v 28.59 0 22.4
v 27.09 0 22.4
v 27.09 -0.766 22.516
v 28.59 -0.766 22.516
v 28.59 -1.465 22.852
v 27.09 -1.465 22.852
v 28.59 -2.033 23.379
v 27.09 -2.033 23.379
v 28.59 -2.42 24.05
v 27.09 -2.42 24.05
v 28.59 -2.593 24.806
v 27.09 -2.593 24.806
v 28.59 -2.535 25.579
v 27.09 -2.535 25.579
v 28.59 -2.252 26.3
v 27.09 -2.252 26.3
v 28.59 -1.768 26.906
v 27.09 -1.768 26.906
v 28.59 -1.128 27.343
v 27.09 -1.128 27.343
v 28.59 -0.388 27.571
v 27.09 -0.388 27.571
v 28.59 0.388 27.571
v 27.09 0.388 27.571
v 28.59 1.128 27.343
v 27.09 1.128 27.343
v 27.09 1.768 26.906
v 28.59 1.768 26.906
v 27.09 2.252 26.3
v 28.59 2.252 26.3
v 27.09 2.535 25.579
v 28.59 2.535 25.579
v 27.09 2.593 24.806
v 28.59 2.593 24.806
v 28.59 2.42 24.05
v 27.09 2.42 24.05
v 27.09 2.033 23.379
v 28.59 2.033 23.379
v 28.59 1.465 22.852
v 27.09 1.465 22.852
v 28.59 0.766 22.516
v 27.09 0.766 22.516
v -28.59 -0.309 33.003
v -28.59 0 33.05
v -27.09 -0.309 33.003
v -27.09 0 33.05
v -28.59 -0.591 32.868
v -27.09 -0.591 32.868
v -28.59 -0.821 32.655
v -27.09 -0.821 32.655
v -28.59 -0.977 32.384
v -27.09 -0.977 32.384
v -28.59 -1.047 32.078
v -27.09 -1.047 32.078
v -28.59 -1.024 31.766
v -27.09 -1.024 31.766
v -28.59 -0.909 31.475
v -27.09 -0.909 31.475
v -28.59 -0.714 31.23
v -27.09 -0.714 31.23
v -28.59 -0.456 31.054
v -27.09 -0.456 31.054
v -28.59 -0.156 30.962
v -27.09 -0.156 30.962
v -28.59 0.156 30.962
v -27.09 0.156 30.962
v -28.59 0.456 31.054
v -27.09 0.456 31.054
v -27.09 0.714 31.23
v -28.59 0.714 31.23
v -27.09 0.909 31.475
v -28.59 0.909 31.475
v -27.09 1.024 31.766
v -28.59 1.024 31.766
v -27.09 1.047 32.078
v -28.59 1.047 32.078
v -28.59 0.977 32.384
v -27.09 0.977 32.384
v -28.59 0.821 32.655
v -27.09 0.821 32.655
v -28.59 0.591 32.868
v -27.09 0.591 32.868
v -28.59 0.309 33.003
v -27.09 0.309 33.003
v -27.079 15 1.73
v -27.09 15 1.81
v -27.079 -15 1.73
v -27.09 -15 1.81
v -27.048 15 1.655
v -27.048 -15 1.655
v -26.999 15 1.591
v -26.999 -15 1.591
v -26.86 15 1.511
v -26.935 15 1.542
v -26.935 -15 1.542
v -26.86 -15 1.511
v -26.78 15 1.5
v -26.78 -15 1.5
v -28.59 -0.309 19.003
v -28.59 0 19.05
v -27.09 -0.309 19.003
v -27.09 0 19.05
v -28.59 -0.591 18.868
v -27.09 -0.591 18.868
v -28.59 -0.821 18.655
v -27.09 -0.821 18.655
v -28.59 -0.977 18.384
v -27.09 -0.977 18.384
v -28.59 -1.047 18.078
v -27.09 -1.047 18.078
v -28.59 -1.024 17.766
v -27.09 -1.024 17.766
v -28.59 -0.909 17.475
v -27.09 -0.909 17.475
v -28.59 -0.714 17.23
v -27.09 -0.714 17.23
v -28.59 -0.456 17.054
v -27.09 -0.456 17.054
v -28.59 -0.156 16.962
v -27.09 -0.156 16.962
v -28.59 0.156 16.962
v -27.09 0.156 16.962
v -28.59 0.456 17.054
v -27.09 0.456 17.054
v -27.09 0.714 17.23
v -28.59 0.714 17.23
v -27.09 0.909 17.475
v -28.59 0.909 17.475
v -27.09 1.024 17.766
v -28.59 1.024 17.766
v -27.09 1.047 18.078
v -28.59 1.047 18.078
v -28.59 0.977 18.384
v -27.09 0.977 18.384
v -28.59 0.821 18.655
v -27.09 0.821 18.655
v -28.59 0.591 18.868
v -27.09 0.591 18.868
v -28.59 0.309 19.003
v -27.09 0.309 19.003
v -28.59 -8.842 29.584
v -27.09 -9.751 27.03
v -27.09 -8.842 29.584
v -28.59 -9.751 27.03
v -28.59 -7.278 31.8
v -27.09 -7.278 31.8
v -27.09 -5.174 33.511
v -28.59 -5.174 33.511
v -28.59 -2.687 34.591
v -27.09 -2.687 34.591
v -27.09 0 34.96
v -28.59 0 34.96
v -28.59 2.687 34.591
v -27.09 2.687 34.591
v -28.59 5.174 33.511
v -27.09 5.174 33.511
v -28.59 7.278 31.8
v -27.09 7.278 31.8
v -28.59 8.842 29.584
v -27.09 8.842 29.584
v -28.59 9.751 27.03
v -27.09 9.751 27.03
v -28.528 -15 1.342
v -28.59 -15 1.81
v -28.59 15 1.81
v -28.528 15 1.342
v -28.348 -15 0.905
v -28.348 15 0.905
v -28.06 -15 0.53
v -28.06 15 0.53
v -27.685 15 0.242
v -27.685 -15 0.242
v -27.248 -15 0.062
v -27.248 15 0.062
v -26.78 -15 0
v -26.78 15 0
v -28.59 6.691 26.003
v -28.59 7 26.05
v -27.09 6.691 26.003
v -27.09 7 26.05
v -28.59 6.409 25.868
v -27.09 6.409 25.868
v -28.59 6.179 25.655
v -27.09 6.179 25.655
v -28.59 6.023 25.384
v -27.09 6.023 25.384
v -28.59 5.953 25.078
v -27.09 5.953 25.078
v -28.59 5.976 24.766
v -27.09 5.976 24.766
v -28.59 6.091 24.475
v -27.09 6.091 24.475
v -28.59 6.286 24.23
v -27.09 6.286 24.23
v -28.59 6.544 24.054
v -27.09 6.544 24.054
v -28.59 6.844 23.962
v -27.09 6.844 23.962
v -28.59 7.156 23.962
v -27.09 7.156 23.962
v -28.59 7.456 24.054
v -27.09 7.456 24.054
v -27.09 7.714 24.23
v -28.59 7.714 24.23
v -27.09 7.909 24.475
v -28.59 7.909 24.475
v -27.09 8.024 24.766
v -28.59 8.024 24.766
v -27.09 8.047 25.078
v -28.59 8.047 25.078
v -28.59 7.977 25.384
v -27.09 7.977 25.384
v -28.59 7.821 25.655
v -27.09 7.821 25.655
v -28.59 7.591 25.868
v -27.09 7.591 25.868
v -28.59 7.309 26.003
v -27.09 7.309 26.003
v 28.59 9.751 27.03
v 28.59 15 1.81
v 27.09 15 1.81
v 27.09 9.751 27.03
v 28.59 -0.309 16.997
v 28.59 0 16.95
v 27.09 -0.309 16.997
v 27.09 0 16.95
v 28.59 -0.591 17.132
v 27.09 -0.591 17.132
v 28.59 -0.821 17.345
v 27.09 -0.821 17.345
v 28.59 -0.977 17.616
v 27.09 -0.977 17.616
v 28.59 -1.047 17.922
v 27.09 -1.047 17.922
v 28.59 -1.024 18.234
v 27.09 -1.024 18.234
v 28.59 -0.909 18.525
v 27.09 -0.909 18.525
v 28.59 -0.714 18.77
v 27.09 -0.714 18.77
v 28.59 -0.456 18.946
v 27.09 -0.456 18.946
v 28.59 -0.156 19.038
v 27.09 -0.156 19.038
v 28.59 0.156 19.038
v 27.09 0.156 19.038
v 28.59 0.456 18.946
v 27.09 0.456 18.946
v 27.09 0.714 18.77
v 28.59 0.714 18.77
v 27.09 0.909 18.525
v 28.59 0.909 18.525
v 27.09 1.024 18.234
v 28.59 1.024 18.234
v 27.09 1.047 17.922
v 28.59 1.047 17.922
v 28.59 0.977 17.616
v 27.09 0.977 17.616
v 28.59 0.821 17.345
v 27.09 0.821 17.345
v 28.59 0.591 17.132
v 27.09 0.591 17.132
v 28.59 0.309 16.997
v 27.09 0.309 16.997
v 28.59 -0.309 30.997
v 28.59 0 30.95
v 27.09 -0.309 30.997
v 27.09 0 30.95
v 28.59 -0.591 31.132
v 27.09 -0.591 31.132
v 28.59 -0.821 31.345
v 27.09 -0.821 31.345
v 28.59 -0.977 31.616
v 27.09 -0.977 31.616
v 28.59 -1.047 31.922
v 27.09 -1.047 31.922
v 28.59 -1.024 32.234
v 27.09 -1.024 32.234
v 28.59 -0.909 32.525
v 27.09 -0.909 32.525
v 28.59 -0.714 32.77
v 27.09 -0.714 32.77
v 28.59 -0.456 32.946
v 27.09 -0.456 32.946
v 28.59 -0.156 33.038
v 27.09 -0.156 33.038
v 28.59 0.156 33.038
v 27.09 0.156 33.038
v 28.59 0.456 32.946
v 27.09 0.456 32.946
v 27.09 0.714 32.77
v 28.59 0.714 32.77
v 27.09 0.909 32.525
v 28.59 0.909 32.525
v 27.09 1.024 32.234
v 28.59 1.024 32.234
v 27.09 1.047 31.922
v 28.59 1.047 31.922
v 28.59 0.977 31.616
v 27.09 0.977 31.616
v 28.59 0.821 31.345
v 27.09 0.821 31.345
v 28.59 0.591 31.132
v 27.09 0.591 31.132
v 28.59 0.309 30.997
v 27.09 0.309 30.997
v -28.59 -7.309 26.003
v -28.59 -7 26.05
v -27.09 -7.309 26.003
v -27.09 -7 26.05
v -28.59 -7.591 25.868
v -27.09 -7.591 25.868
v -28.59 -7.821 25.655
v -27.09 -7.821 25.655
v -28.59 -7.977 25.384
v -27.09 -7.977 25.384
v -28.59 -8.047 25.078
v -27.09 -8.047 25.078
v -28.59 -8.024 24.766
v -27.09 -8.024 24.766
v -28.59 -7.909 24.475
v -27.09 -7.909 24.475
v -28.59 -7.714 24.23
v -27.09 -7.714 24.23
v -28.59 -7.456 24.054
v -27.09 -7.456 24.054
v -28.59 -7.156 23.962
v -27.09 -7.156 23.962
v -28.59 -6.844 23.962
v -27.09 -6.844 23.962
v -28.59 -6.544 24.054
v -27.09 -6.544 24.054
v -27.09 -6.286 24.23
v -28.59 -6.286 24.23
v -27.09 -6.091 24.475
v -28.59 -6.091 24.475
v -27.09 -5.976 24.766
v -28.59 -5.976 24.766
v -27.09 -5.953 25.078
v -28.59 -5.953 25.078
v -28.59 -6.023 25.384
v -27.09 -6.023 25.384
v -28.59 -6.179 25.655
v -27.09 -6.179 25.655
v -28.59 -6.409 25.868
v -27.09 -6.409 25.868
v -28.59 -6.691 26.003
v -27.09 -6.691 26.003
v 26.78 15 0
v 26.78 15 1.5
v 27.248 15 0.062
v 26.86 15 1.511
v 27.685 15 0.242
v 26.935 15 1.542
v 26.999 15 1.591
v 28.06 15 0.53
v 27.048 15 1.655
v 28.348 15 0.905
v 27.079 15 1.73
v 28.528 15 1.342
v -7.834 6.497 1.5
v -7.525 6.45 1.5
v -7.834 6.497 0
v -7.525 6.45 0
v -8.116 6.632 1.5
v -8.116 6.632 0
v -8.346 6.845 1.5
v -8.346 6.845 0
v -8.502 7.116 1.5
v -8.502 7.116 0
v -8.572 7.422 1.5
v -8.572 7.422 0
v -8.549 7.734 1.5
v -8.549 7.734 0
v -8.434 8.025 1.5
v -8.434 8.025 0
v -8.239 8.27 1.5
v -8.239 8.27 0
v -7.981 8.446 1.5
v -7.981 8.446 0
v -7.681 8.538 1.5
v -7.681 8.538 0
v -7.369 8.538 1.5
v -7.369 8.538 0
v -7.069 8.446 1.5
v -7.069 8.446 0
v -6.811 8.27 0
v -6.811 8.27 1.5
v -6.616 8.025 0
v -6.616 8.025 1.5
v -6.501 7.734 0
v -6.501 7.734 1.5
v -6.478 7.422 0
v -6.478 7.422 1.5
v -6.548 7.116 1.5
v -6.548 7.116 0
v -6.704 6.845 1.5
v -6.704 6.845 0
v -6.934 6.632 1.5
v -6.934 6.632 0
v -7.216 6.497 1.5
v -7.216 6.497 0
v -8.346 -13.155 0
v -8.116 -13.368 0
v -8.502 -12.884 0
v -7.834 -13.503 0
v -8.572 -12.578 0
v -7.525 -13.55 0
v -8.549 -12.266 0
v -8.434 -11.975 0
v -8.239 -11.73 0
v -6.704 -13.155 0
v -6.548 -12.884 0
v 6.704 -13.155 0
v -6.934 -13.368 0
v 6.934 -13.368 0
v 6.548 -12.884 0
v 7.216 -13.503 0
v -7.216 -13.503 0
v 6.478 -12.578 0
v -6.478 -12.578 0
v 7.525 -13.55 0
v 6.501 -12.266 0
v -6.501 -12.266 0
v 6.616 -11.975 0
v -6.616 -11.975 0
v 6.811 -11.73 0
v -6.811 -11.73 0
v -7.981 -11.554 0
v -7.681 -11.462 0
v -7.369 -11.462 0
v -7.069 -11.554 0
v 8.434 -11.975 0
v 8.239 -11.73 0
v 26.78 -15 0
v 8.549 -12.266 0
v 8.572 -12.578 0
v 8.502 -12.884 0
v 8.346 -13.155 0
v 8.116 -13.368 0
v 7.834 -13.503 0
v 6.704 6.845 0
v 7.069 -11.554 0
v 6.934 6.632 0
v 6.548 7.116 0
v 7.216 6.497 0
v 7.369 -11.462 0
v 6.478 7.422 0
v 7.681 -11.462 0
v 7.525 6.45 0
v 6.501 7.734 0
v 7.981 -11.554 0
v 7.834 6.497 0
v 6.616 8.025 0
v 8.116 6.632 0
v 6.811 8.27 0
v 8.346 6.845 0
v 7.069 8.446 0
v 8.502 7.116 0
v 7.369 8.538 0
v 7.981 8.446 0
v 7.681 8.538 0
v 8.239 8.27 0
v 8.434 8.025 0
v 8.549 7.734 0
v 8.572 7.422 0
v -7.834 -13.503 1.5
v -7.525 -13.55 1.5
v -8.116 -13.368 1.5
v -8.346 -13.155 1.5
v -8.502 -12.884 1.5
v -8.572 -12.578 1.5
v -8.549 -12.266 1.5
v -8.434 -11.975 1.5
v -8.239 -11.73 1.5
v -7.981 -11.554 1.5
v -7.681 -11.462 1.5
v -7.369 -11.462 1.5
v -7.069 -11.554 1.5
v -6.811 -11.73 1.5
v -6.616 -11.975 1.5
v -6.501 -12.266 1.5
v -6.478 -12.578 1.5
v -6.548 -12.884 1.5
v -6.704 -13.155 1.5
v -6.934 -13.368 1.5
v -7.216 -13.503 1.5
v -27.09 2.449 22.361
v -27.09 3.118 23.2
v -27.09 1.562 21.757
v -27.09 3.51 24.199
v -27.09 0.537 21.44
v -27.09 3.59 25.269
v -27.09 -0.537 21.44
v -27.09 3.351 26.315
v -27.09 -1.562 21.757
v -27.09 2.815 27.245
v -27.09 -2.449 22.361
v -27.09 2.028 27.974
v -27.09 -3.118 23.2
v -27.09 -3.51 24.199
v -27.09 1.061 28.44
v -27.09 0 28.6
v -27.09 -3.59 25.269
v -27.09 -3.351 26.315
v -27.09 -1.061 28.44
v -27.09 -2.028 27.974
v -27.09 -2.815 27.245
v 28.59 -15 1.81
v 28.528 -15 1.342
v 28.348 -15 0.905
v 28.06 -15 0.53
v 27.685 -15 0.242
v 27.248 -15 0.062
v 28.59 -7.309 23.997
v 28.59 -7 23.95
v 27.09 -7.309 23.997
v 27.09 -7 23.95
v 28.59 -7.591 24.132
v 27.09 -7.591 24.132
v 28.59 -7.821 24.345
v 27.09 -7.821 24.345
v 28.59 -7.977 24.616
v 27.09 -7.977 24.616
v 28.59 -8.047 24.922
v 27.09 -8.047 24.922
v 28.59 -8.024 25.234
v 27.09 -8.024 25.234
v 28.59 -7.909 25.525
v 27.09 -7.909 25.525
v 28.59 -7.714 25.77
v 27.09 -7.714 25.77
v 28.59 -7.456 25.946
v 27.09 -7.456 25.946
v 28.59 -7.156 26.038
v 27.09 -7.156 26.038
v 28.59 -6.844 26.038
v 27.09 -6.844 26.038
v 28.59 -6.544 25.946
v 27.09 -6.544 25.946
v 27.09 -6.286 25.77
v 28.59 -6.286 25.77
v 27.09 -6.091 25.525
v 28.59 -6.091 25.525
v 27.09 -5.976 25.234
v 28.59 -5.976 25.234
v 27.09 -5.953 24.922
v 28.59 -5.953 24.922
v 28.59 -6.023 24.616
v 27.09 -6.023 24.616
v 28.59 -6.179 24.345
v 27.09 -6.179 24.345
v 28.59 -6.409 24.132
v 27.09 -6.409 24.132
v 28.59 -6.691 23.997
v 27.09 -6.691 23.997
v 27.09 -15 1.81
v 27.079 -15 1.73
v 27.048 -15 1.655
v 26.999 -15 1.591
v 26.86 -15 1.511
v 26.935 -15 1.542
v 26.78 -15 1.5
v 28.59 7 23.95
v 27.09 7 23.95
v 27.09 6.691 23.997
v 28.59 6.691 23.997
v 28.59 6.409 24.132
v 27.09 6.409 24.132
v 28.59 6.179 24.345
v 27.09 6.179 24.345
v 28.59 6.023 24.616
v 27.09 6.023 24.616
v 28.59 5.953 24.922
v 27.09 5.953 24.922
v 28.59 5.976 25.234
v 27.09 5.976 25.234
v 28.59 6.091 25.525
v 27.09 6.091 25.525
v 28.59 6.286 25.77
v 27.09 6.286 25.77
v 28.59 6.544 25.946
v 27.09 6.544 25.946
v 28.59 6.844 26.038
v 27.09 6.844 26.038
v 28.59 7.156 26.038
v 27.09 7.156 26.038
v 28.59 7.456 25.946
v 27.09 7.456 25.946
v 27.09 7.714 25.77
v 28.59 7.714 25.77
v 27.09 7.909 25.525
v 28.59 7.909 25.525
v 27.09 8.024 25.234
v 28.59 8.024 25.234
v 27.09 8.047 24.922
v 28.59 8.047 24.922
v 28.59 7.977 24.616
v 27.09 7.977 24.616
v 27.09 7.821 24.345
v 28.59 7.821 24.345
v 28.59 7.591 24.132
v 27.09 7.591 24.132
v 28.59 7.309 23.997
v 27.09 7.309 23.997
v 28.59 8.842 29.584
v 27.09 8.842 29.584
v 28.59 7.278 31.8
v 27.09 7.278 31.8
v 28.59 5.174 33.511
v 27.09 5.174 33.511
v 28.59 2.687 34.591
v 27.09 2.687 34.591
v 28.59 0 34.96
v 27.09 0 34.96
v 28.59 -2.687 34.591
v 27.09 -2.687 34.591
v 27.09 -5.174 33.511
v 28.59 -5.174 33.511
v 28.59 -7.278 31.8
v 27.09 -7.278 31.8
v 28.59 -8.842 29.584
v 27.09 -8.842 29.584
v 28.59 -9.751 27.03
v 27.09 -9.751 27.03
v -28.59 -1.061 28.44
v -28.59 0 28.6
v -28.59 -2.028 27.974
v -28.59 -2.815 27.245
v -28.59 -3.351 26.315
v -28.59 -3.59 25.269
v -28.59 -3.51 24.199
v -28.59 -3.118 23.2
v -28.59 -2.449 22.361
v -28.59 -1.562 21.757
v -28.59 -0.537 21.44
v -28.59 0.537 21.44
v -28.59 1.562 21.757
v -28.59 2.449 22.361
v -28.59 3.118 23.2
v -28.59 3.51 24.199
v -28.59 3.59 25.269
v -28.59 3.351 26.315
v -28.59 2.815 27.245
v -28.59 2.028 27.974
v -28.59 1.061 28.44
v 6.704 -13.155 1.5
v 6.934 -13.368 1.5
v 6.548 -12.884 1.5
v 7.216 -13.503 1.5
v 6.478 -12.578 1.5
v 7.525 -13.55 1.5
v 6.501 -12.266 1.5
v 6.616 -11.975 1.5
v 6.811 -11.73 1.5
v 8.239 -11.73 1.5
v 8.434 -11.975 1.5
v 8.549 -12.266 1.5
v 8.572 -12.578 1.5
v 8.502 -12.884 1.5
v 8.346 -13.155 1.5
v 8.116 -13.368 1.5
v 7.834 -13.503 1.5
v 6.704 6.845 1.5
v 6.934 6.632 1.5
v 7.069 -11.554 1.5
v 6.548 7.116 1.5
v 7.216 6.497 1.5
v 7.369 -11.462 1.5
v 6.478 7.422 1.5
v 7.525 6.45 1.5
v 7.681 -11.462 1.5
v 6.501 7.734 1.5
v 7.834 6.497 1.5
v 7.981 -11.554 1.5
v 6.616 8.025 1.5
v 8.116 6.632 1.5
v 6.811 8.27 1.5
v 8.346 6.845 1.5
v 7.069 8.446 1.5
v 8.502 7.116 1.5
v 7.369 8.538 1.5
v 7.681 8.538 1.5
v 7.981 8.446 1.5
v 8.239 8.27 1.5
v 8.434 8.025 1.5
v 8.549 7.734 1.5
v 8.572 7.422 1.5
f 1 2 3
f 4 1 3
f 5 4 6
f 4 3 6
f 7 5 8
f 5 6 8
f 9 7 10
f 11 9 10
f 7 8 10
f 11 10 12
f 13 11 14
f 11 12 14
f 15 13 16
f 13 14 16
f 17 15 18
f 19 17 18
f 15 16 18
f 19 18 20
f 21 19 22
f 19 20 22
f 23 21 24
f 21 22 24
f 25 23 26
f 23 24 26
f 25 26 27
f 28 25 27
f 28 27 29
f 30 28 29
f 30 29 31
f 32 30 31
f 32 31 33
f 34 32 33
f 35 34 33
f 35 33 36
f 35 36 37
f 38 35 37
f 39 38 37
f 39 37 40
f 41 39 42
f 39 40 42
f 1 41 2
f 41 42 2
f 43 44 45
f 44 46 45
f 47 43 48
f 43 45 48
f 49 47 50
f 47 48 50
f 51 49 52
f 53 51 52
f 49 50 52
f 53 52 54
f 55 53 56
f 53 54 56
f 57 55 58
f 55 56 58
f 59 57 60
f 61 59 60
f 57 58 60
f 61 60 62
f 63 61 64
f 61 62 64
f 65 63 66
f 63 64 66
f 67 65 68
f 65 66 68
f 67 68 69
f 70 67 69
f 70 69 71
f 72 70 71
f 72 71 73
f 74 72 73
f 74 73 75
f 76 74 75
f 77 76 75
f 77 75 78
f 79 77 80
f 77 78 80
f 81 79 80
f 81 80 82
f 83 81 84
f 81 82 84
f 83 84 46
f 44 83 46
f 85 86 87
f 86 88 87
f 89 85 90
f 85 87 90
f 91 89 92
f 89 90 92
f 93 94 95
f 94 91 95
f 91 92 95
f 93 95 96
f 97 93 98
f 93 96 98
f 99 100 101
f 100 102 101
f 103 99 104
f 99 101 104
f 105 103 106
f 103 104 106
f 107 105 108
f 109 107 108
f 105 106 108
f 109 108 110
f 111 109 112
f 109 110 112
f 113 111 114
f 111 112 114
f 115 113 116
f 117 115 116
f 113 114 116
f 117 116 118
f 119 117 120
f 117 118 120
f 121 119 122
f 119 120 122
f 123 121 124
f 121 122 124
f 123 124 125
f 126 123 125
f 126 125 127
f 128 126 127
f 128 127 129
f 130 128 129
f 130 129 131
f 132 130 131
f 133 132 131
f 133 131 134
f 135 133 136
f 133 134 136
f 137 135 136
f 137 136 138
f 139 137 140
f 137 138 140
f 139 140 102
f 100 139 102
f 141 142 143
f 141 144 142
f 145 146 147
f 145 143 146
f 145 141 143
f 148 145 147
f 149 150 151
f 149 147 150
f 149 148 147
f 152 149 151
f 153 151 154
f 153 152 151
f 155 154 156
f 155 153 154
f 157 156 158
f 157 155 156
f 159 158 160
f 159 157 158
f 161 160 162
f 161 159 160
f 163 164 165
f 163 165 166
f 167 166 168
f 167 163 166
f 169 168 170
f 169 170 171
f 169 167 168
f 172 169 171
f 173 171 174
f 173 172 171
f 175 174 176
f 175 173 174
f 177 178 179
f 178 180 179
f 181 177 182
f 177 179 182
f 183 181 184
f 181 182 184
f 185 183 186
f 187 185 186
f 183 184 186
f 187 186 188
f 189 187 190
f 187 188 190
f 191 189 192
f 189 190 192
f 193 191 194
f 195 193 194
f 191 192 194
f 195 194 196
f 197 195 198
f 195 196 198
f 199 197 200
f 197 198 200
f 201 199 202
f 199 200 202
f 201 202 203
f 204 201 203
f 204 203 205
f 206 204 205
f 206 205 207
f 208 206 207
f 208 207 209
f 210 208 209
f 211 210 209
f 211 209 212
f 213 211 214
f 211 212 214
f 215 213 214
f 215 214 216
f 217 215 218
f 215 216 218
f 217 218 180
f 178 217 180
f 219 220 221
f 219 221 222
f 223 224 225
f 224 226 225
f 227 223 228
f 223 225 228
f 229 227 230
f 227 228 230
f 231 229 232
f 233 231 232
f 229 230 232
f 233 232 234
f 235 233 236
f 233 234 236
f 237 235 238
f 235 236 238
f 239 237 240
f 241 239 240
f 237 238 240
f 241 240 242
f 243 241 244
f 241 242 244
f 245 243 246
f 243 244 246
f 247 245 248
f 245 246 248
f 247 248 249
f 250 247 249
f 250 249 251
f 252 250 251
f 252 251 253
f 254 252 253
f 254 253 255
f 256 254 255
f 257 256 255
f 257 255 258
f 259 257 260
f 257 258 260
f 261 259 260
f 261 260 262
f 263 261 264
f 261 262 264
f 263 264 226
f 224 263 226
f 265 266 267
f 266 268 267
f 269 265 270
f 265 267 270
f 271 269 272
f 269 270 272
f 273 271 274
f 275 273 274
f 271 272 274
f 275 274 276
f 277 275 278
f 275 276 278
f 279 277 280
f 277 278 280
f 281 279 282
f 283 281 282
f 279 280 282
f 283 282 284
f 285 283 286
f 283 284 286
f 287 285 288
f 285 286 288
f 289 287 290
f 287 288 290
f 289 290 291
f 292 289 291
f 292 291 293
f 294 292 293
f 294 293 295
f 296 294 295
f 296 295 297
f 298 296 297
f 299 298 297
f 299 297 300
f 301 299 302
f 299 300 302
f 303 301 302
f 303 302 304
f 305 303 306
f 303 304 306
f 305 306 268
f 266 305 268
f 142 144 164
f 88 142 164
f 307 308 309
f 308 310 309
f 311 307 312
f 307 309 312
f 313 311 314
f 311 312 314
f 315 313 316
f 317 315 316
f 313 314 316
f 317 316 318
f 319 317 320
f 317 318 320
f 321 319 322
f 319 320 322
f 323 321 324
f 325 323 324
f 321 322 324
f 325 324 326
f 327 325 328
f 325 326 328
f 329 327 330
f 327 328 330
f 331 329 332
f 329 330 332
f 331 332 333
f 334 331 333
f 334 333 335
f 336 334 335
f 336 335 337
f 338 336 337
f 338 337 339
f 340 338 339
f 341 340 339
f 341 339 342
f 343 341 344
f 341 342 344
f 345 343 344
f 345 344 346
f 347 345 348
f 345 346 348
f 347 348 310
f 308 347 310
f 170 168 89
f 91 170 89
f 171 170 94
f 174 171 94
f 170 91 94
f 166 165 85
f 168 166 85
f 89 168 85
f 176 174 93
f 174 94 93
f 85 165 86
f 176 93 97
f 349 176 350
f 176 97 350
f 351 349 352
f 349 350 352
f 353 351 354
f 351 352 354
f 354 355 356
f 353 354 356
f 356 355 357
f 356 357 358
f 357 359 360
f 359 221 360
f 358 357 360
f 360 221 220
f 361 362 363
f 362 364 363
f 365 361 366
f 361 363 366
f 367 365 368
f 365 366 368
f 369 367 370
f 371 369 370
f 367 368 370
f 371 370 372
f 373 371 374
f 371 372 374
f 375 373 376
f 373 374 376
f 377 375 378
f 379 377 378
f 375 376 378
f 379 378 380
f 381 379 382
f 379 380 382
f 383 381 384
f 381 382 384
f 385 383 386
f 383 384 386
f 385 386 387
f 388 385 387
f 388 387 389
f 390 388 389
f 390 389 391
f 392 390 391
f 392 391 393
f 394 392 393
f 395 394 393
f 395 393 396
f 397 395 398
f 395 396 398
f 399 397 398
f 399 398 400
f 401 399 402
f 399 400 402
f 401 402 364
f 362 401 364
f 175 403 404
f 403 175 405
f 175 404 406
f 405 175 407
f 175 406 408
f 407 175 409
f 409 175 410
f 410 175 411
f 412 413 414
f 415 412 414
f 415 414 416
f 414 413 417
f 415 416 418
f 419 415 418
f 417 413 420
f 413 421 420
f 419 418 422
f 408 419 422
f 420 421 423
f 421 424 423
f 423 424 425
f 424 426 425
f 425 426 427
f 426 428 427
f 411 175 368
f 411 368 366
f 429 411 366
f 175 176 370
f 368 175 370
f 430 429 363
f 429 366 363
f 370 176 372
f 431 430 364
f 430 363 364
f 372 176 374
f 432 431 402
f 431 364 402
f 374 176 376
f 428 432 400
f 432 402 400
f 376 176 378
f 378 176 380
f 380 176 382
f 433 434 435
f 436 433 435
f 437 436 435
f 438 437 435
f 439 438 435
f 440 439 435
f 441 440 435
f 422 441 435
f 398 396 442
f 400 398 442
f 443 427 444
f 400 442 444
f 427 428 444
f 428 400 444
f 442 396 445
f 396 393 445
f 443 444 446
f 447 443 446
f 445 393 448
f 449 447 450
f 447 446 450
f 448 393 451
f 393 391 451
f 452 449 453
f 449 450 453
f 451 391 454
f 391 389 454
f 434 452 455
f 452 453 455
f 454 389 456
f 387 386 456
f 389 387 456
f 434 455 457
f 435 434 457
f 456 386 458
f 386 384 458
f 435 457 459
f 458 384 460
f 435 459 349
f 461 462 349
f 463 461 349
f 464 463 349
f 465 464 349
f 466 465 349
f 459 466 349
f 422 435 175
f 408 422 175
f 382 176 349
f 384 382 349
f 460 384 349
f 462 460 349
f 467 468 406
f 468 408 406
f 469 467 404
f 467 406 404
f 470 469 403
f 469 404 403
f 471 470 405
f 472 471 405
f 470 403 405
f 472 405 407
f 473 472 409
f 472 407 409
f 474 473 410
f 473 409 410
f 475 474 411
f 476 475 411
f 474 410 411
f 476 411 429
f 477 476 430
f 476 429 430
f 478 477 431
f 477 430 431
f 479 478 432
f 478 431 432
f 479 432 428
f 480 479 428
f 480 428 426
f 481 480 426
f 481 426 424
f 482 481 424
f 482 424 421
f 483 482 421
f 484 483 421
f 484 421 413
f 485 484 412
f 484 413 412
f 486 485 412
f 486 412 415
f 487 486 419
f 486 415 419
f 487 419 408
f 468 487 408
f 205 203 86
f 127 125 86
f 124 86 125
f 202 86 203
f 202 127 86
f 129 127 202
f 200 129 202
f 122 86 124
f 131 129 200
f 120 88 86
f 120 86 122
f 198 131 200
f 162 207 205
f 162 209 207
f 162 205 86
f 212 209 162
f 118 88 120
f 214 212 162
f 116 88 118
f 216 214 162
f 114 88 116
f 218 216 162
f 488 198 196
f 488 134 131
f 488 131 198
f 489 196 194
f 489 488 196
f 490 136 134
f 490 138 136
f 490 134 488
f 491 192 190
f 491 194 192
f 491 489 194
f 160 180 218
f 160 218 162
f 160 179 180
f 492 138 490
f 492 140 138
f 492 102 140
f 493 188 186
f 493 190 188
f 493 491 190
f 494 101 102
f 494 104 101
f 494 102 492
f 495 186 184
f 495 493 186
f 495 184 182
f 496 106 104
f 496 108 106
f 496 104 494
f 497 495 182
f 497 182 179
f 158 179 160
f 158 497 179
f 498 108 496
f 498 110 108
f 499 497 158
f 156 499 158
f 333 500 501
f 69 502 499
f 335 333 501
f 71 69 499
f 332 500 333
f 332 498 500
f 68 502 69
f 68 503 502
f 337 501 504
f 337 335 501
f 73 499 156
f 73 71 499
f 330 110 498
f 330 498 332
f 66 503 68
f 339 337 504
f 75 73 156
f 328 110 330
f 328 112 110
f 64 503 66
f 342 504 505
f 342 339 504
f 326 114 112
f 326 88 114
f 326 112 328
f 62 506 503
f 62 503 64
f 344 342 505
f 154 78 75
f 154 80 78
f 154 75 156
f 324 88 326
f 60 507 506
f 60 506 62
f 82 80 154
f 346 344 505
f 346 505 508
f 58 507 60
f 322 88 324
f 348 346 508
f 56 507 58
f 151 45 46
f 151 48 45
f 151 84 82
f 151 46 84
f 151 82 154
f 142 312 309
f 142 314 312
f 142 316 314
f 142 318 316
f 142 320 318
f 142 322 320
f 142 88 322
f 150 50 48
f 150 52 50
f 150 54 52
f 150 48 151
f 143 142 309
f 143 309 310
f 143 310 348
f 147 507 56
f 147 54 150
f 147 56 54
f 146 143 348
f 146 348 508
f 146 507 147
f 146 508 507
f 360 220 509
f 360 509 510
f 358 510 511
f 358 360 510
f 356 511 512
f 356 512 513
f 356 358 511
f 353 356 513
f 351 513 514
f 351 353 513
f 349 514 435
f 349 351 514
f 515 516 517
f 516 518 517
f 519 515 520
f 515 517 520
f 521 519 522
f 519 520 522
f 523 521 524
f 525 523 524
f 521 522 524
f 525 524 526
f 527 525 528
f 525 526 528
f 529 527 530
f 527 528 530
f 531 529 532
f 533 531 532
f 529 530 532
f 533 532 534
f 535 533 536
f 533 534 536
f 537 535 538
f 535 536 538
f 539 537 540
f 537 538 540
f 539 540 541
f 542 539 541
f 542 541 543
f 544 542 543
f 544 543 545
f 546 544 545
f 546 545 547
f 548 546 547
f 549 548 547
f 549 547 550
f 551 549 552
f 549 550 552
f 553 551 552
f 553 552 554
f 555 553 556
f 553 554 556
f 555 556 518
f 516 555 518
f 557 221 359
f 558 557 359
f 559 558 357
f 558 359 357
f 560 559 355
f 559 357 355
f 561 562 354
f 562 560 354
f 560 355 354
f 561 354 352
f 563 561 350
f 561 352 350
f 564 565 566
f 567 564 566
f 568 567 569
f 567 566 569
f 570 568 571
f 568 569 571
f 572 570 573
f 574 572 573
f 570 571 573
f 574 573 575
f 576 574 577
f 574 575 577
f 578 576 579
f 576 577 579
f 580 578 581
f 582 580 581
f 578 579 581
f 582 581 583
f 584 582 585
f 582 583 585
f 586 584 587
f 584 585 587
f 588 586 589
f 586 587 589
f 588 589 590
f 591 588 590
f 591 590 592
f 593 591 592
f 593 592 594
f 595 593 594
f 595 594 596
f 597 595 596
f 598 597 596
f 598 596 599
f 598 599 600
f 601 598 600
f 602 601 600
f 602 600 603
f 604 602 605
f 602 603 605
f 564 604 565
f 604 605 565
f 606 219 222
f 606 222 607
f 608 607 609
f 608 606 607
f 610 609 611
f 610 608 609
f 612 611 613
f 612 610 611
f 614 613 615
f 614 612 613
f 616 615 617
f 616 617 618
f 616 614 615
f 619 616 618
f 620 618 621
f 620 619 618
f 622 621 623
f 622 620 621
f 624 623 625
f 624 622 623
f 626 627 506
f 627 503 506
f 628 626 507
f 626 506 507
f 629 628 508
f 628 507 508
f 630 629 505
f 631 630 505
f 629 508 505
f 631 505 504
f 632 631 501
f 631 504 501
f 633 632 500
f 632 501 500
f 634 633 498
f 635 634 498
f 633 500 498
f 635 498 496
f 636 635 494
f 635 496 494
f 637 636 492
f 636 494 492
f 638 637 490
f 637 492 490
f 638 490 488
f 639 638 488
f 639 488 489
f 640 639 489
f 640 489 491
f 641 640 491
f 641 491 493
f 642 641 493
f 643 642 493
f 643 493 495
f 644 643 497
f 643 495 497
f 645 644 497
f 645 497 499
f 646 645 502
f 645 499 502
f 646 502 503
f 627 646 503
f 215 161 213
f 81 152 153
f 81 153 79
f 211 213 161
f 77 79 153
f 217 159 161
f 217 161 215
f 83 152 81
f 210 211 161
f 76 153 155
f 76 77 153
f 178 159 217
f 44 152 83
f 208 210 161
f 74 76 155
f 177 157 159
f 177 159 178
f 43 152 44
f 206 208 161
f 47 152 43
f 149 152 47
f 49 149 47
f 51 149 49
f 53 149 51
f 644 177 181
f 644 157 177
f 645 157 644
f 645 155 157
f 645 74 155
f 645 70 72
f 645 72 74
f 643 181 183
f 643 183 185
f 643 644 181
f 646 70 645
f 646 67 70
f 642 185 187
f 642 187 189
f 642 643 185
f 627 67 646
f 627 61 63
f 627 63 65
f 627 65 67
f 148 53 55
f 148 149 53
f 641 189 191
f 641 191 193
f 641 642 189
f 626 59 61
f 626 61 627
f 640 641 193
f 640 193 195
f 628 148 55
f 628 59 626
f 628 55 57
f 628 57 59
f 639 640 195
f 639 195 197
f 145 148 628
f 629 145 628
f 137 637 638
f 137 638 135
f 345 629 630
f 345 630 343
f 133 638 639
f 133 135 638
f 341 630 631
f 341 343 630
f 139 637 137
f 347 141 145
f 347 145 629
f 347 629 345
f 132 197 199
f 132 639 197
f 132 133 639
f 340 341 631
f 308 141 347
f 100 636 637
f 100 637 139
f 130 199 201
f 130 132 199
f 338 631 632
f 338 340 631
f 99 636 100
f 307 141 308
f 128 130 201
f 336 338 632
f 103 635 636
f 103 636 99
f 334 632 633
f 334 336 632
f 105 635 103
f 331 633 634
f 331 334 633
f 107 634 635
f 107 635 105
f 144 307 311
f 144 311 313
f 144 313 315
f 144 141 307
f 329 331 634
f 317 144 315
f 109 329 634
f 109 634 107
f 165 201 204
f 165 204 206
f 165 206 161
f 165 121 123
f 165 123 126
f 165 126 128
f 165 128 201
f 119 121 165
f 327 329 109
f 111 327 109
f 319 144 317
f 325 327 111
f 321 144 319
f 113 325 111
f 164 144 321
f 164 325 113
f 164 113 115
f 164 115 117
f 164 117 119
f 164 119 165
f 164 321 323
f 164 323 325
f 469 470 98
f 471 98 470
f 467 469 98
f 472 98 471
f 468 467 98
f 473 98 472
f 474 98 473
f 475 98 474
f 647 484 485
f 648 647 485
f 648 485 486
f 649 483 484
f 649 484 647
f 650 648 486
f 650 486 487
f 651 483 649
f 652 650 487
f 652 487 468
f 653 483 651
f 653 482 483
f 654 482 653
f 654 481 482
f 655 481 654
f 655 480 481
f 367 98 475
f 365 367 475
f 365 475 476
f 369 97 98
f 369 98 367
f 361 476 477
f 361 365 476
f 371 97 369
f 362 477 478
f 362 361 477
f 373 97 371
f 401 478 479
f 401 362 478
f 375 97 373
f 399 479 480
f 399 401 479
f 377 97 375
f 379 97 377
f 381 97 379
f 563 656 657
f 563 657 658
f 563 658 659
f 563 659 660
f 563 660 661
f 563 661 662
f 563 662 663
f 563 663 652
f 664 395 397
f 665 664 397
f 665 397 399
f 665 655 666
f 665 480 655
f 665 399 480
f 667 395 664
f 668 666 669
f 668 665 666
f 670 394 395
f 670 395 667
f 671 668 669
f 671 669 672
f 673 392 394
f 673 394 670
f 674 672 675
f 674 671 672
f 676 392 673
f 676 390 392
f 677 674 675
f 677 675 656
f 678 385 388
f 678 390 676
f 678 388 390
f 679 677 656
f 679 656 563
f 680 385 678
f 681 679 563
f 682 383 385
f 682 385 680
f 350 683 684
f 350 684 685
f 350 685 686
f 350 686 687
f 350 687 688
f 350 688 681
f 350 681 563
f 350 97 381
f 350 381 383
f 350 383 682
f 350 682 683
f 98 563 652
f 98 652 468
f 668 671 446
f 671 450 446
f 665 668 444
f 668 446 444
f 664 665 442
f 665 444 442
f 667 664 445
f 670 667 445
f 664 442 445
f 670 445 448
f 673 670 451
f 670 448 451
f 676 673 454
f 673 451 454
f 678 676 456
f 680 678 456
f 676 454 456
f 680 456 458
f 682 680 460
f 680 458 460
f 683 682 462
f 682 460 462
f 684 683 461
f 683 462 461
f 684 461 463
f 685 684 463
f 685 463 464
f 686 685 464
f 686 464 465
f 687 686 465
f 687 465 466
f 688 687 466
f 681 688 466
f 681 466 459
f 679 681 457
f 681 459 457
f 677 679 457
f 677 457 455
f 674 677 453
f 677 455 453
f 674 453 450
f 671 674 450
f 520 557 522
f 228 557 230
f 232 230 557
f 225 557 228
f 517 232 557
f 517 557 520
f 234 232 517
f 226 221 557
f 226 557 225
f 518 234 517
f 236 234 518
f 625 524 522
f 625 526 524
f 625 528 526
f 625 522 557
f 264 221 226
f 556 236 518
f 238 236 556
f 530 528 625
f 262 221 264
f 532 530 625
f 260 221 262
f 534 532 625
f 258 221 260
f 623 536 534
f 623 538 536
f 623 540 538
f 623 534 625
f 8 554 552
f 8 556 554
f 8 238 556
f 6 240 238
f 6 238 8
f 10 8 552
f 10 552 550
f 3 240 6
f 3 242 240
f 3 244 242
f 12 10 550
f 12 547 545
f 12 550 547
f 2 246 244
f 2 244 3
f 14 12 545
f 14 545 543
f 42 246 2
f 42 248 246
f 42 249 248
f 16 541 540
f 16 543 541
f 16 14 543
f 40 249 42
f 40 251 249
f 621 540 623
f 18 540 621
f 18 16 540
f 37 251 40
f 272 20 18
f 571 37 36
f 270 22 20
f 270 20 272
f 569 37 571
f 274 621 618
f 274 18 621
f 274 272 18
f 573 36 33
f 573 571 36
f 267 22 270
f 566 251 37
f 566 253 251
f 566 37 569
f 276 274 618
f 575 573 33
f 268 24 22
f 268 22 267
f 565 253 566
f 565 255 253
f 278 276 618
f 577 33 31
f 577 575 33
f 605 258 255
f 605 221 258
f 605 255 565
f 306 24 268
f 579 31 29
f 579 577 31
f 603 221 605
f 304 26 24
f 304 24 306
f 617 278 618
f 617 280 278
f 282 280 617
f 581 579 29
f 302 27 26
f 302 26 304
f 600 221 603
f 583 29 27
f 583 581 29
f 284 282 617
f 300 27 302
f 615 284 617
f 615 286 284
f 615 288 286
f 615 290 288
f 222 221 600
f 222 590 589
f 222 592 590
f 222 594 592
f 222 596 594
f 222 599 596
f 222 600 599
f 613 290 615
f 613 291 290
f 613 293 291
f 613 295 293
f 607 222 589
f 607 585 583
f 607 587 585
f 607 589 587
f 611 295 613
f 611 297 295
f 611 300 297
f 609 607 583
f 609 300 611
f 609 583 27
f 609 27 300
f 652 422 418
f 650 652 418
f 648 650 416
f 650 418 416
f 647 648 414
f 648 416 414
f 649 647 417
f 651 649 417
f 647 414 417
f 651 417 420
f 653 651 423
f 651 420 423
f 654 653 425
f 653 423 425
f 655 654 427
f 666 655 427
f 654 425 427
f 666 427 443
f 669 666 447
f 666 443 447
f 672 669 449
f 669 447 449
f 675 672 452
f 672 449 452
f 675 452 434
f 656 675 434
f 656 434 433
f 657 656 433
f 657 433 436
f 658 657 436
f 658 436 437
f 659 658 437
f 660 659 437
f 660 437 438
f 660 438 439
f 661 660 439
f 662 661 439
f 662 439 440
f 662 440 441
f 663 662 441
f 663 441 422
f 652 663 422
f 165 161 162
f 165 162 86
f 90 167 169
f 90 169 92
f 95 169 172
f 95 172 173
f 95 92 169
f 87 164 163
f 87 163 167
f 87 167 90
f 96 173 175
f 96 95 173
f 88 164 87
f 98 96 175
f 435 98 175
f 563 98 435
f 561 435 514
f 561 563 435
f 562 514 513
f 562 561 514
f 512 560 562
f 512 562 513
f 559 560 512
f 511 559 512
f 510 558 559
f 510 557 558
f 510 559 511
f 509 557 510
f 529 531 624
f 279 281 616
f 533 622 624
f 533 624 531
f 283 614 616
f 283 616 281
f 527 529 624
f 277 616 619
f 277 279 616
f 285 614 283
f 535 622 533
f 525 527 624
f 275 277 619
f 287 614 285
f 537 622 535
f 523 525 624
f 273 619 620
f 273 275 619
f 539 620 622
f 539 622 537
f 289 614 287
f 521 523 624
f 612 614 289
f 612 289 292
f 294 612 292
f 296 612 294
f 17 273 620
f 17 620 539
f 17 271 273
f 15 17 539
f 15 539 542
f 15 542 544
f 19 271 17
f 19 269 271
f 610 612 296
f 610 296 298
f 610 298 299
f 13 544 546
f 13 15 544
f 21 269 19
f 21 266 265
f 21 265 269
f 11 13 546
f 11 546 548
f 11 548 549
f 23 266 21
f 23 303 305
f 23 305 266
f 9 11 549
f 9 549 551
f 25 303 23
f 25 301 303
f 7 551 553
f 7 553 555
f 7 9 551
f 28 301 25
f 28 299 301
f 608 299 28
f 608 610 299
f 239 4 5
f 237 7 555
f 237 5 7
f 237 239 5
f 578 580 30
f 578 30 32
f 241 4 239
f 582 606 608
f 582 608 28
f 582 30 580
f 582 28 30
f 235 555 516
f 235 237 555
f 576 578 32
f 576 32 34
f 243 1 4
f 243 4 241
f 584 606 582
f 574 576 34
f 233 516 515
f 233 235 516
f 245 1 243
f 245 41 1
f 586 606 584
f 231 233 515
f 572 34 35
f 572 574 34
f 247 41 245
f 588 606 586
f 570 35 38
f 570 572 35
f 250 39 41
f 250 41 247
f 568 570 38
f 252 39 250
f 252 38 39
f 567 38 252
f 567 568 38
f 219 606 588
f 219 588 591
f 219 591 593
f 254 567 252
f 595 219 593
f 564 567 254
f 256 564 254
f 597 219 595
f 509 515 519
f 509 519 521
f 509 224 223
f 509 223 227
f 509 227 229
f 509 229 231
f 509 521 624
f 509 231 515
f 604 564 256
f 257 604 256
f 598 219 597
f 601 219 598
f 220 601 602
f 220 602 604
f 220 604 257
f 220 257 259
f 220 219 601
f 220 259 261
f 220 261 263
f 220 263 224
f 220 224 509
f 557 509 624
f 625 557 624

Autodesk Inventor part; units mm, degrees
ref_plane "YZ Plane" through (0, 0, 0) normal (1, 0, 0) x (0, 1, 0)
ref_plane "XZ Plane" through (0, 0, 0) normal (0, 1, 0) x (-1, 0, 0)
ref_plane "XY Plane" through (0, 0, 0) normal (0, 0, 1) x (1, 0, 0)
sketch "Sketch1" plane through (0, 0, 0) normal (0, 0, 1) x (1, 0, 0)
  line L0 (-28.59, -15) -> (28.59, -15)
  line L1 (28.59, -15) -> (28.59, 15)
  line L2 (28.59, 15) -> (-28.59, 15)
  line L3 (-28.59, 15) -> (-28.59, -15)
  line L4 (-28.59, -15) -> (28.59, 15) construction
  line L5 (28.59, -15) -> (-28.59, 15) construction
  point P0 (0, 0)
  dimension "d0" = 57.18
  dimension "d1" = 30
extrude "Plate1" add sketch "Sketch1" along normal blind 1.5
sketch "Sketch2" plane through (-27.09, -15, 0) normal (-1, 0, 0) x (0, -1, 0)
  line L0 (-30, 0) -> (0, 0)
  line L1 (0, 0) -> (0, 40)
  line L2 (0, 40) -> (-30, 40)
  line L3 (-30, 40) -> (-30, 0)
edge flange "Flange1" height 40 angle 90 thickness 1.5 bend radius 0.31 thickness toward (-1, 0, 0) relief tear relief width 1.5 relief depth 0.75 corner gap 0.31 corner form 0 edges at (-28.59, 0, 1.5) (28.59, 0, 1.5) wall of the first edge with corners at (-27.09, 15, 0) (-27.09, -15, 0) (-27.09, -15, 40) (-27.09, 15, 40)
bend "Bend1"
corner "Corner1"
sketch "Sketch3" plane through (28.59, -15, 40) normal (1, 0, 0) x (0, 0, -1)
  circle A0 centre (15, 15) radius 9.96
  line L0 (0, 30) -> (38.19, 30) projected
  line L1 (38.19, 0) -> (0, 0) projected
  line L2 (38.19, 30) -> (12.9705, 24.751)
  line L3 (38.19, 0) -> (12.9705, 5.249)
  line L4 (0, 30) -> (0, 0)
  point P0 (40, 15)
  dimension "d13" = 19.92
  dimension "d14" = 0
  dimension "d15" = 25
sketch "Sketch19" plane through (0, 0, 1.5) normal (0, 0, 1) x (1, 0, 0)
  point P0 (0, 0)
sketch "Sketch21" plane through (-28.59, -15, 1.81) normal (-1, 0, 0) x (0, 0, 1)
  point P0 (-1.81, 15)
sketch "Sketch23" plane through (-28.59, -15, 1.81) normal (-1, 0, 0) x (0, 0, 1)
  point P0 (-1.81, 15)
sketch "Sketch25" plane through (0, 0, 1.5) normal (0, 0, 1) x (1, 0, 0)
  circle A0 centre (7.525, 7.5) radius 0.7835
  circle A1 centre (7.525, -12.5) radius 0.7835
  circle A2 centre (-7.525, -12.5) radius 0.7835
  circle A3 centre (-7.525, 7.5) radius 0.7835
  point P0 (0, 0)
hole "Hole12" at (7.525, 7.5, 1.5) at (7.525, -12.5, 1.5) at (-7.525, 7.5, 1.5) at (-7.525, -12.5, 1.5) direction (0, 0, -1) diameter 2.1 depth 1.5
extrude "Cut7" cut sketch "Sketch3" against normal blind 1.5 contours A0 L3 L1 L4 L0 L2
mirror "Mirror1" about plane through (0, 0, 0) normal (1, 0, 0) of "Cut7"
sketch "Sketch26" plane through (-28.59, -15, 1.81) normal (-1, 0, 0) x (0, 0, 1)
  circle A0 centre (30.19, 15) radius 0.7835 projected
  circle A1 centre (23.19, 22) radius 0.7835 projected
  circle A2 centre (23.19, 8) radius 0.7835 projected
  circle A3 centre (16.19, 15) radius 0.7835 projected
  point P0 (-1.81, 15)
hole "Hole13" at (-28.59, 0, 32) at (-28.59, 7, 25) at (-28.59, -7, 25) at (-28.59, 0, 18) direction (1, 0, 0) diameter 2.1 depth 1.5
sketch "Sketch27" plane through (-28.59, -15, 1.81) normal (-1, 0, 0) x (0, 0, 1)
  circle A0 centre (23.19, 15) radius 3 projected
  point P0 (-1.81, 15)
hole "Hole14" at (-28.59, 0, 25) direction (1, 0, 0) diameter 7.2 depth 1.5
sketch "Sketch28" plane through (28.59, -15, 1.81) normal (1, 0, 0) x (0, 0, -1)
  circle A0 centre (-30.19, 15) radius 0.7835 projected
  circle A1 centre (-23.19, 8) radius 0.7835 projected
  circle A2 centre (-23.19, 22) radius 0.7835 projected
  circle A3 centre (-16.19, 15) radius 0.7835 projected
  point P0 (1.81, 15)
hole "Hole15" at (28.59, 0, 32) at (28.59, -7, 25) at (28.59, 0, 18) at (28.59, 7, 25) direction (-1, 0, 0) diameter 2.1 depth 1.5
sketch "Sketch29" plane through (28.59, -15, 1.81) normal (1, 0, 0) x (0, 0, -1)
  circle A0 centre (-23.19, 15) radius 1.75 projected
  point P0 (1.81, 15)
hole "Hole16" at (28.59, 0, 25) direction (-1, 0, 0) diameter 5.2 depth 1.5
equation "\"d125\" = Thickness"
equation "\"d127\" = Thickness"
equation "\"d134\" = Thickness"
equation "\"d141\" = Thickness"
equation "\"d148\" = Thickness"
equation "\"d155\" = Thickness"
equation "\"d2\" = Thickness"
equation "\"d3\" = BendReliefWidth"
equation "\"d4\" = BendReliefDepth"
equation "\"d5\" = MinimumRemnant"
equation "\"d6\" = TransitionRadius"
equation "\"d9\" = BendRadius"
equation "\"d10\" = CornerReliefSize"
equation "\"d11\" = GapSize"
equation "\"d12\" = JacobiRadiusSize"
equation "\"BendReliefWidth\" = Thickness"
equation "\"BendReliefDepth\" = 0.5 * Thickness"
equation "\"CornerReliefSize\" = 4 * Thickness"
equation "\"MinimumRemnant\" = 2 * Thickness"
equation "\"TransitionRadius\" = BendRadius"
equation "\"JacobiRadiusSize\" = BendRadius"
equation "\"GapSize\" = Thickness"
equation "\"Thickness\" = 1.5"
equation "\"BendRadius\" = 0.31"
properties part number "axis_14_bottom_frame" material "Aluminum 6061-AHC"
